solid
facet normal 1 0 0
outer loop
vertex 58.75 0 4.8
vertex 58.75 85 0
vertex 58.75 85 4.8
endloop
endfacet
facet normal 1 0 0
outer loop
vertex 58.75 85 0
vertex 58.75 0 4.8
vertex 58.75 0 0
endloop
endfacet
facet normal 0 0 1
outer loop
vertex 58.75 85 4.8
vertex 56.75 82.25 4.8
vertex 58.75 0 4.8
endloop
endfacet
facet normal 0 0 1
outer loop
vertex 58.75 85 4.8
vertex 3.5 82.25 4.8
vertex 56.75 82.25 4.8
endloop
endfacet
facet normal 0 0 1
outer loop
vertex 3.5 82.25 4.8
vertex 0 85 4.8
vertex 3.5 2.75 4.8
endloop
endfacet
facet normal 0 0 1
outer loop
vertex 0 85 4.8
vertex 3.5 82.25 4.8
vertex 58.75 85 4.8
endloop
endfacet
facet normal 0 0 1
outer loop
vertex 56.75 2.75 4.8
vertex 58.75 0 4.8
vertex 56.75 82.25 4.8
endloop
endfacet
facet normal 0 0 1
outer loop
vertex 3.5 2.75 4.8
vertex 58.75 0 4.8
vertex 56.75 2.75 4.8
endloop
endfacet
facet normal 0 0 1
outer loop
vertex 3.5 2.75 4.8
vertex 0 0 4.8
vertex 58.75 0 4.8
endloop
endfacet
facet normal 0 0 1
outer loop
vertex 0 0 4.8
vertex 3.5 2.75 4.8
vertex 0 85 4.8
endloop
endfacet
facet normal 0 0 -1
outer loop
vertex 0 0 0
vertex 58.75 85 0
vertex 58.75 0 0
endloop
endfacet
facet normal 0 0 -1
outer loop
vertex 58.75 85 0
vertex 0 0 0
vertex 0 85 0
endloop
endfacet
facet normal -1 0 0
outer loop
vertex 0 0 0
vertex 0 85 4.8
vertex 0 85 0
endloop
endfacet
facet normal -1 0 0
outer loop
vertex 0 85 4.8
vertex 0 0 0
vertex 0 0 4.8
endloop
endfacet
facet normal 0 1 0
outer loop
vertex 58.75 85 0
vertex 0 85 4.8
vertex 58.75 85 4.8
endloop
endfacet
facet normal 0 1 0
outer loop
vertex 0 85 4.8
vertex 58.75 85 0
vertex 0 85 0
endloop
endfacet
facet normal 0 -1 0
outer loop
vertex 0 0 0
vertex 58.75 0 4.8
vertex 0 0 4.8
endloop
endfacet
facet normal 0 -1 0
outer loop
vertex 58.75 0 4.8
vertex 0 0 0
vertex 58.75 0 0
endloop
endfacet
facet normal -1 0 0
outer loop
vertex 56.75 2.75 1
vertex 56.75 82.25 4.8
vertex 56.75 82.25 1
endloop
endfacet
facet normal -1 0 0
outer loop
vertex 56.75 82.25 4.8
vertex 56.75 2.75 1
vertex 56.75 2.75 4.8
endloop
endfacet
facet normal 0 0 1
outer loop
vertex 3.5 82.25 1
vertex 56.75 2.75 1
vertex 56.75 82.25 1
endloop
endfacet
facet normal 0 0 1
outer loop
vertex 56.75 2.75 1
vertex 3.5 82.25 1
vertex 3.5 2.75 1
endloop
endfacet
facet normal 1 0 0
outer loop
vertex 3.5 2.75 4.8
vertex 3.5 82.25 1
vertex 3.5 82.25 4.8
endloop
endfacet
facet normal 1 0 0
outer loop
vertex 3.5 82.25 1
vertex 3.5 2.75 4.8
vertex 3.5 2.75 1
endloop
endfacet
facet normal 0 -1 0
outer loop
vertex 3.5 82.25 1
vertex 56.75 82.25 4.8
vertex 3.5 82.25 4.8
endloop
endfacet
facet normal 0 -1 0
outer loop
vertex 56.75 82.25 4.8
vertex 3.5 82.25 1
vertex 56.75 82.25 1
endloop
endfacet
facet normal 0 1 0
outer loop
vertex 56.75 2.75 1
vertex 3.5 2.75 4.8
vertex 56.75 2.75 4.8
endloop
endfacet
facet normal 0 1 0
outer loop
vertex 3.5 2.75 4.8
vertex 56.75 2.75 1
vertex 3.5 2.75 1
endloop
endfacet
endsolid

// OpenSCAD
/*
 * Nomad Core - X306 + Pi Case Brainplate
 * Standalone brainplate with recessed cutout pocket
 */

// ============================================
// BRAINPLATE CONFIGURATION
// ============================================
// Outer block dimensions (adjusted to satisfy perimeter constraints)
base_width = 58.75;     // X dimension (mm) -> gives 3.5 mm + 2.0 mm side borders around 53.25 mm cutout
base_length = 85.0;     // Y dimension (mm)
base_height = 4.8;      // Z dimension (mm)

// Cutout block dimensions
cutout_width = 53.25;   // X dimension (mm)
cutout_length = 79.5;   // Y dimension (mm)
cutout_height = 40.0;   // Tall enough to fully pass through above cut floor (mm)

// Cutout placement
cutout_floor_z = 1.0;   // Leaves a 1.0 mm floor thickness in base block
cutout_border_x_left = 3.5; // Border on one long side wall (mm)

// Derived placement
cutout_x = cutout_border_x_left;                         // Leaves 2.0 mm on opposite long side wall
cutout_y = (base_length - cutout_length) / 2;           // Symmetric short-end borders (>= 2 mm)

// ============================================
// RENDER QUALITY
// ============================================
$fn = 64;

// ============================================
// MODEL
// ============================================
module x306_pi_brainplate() {
    difference() {
        cube([base_width, base_length, base_height], center=false);
        translate([cutout_x, cutout_y, cutout_floor_z])
            cube([cutout_width, cutout_length, cutout_height], center=false);
    }
}

// ============================================
// MAIN RENDER
// ============================================
x306_pi_brainplate();
